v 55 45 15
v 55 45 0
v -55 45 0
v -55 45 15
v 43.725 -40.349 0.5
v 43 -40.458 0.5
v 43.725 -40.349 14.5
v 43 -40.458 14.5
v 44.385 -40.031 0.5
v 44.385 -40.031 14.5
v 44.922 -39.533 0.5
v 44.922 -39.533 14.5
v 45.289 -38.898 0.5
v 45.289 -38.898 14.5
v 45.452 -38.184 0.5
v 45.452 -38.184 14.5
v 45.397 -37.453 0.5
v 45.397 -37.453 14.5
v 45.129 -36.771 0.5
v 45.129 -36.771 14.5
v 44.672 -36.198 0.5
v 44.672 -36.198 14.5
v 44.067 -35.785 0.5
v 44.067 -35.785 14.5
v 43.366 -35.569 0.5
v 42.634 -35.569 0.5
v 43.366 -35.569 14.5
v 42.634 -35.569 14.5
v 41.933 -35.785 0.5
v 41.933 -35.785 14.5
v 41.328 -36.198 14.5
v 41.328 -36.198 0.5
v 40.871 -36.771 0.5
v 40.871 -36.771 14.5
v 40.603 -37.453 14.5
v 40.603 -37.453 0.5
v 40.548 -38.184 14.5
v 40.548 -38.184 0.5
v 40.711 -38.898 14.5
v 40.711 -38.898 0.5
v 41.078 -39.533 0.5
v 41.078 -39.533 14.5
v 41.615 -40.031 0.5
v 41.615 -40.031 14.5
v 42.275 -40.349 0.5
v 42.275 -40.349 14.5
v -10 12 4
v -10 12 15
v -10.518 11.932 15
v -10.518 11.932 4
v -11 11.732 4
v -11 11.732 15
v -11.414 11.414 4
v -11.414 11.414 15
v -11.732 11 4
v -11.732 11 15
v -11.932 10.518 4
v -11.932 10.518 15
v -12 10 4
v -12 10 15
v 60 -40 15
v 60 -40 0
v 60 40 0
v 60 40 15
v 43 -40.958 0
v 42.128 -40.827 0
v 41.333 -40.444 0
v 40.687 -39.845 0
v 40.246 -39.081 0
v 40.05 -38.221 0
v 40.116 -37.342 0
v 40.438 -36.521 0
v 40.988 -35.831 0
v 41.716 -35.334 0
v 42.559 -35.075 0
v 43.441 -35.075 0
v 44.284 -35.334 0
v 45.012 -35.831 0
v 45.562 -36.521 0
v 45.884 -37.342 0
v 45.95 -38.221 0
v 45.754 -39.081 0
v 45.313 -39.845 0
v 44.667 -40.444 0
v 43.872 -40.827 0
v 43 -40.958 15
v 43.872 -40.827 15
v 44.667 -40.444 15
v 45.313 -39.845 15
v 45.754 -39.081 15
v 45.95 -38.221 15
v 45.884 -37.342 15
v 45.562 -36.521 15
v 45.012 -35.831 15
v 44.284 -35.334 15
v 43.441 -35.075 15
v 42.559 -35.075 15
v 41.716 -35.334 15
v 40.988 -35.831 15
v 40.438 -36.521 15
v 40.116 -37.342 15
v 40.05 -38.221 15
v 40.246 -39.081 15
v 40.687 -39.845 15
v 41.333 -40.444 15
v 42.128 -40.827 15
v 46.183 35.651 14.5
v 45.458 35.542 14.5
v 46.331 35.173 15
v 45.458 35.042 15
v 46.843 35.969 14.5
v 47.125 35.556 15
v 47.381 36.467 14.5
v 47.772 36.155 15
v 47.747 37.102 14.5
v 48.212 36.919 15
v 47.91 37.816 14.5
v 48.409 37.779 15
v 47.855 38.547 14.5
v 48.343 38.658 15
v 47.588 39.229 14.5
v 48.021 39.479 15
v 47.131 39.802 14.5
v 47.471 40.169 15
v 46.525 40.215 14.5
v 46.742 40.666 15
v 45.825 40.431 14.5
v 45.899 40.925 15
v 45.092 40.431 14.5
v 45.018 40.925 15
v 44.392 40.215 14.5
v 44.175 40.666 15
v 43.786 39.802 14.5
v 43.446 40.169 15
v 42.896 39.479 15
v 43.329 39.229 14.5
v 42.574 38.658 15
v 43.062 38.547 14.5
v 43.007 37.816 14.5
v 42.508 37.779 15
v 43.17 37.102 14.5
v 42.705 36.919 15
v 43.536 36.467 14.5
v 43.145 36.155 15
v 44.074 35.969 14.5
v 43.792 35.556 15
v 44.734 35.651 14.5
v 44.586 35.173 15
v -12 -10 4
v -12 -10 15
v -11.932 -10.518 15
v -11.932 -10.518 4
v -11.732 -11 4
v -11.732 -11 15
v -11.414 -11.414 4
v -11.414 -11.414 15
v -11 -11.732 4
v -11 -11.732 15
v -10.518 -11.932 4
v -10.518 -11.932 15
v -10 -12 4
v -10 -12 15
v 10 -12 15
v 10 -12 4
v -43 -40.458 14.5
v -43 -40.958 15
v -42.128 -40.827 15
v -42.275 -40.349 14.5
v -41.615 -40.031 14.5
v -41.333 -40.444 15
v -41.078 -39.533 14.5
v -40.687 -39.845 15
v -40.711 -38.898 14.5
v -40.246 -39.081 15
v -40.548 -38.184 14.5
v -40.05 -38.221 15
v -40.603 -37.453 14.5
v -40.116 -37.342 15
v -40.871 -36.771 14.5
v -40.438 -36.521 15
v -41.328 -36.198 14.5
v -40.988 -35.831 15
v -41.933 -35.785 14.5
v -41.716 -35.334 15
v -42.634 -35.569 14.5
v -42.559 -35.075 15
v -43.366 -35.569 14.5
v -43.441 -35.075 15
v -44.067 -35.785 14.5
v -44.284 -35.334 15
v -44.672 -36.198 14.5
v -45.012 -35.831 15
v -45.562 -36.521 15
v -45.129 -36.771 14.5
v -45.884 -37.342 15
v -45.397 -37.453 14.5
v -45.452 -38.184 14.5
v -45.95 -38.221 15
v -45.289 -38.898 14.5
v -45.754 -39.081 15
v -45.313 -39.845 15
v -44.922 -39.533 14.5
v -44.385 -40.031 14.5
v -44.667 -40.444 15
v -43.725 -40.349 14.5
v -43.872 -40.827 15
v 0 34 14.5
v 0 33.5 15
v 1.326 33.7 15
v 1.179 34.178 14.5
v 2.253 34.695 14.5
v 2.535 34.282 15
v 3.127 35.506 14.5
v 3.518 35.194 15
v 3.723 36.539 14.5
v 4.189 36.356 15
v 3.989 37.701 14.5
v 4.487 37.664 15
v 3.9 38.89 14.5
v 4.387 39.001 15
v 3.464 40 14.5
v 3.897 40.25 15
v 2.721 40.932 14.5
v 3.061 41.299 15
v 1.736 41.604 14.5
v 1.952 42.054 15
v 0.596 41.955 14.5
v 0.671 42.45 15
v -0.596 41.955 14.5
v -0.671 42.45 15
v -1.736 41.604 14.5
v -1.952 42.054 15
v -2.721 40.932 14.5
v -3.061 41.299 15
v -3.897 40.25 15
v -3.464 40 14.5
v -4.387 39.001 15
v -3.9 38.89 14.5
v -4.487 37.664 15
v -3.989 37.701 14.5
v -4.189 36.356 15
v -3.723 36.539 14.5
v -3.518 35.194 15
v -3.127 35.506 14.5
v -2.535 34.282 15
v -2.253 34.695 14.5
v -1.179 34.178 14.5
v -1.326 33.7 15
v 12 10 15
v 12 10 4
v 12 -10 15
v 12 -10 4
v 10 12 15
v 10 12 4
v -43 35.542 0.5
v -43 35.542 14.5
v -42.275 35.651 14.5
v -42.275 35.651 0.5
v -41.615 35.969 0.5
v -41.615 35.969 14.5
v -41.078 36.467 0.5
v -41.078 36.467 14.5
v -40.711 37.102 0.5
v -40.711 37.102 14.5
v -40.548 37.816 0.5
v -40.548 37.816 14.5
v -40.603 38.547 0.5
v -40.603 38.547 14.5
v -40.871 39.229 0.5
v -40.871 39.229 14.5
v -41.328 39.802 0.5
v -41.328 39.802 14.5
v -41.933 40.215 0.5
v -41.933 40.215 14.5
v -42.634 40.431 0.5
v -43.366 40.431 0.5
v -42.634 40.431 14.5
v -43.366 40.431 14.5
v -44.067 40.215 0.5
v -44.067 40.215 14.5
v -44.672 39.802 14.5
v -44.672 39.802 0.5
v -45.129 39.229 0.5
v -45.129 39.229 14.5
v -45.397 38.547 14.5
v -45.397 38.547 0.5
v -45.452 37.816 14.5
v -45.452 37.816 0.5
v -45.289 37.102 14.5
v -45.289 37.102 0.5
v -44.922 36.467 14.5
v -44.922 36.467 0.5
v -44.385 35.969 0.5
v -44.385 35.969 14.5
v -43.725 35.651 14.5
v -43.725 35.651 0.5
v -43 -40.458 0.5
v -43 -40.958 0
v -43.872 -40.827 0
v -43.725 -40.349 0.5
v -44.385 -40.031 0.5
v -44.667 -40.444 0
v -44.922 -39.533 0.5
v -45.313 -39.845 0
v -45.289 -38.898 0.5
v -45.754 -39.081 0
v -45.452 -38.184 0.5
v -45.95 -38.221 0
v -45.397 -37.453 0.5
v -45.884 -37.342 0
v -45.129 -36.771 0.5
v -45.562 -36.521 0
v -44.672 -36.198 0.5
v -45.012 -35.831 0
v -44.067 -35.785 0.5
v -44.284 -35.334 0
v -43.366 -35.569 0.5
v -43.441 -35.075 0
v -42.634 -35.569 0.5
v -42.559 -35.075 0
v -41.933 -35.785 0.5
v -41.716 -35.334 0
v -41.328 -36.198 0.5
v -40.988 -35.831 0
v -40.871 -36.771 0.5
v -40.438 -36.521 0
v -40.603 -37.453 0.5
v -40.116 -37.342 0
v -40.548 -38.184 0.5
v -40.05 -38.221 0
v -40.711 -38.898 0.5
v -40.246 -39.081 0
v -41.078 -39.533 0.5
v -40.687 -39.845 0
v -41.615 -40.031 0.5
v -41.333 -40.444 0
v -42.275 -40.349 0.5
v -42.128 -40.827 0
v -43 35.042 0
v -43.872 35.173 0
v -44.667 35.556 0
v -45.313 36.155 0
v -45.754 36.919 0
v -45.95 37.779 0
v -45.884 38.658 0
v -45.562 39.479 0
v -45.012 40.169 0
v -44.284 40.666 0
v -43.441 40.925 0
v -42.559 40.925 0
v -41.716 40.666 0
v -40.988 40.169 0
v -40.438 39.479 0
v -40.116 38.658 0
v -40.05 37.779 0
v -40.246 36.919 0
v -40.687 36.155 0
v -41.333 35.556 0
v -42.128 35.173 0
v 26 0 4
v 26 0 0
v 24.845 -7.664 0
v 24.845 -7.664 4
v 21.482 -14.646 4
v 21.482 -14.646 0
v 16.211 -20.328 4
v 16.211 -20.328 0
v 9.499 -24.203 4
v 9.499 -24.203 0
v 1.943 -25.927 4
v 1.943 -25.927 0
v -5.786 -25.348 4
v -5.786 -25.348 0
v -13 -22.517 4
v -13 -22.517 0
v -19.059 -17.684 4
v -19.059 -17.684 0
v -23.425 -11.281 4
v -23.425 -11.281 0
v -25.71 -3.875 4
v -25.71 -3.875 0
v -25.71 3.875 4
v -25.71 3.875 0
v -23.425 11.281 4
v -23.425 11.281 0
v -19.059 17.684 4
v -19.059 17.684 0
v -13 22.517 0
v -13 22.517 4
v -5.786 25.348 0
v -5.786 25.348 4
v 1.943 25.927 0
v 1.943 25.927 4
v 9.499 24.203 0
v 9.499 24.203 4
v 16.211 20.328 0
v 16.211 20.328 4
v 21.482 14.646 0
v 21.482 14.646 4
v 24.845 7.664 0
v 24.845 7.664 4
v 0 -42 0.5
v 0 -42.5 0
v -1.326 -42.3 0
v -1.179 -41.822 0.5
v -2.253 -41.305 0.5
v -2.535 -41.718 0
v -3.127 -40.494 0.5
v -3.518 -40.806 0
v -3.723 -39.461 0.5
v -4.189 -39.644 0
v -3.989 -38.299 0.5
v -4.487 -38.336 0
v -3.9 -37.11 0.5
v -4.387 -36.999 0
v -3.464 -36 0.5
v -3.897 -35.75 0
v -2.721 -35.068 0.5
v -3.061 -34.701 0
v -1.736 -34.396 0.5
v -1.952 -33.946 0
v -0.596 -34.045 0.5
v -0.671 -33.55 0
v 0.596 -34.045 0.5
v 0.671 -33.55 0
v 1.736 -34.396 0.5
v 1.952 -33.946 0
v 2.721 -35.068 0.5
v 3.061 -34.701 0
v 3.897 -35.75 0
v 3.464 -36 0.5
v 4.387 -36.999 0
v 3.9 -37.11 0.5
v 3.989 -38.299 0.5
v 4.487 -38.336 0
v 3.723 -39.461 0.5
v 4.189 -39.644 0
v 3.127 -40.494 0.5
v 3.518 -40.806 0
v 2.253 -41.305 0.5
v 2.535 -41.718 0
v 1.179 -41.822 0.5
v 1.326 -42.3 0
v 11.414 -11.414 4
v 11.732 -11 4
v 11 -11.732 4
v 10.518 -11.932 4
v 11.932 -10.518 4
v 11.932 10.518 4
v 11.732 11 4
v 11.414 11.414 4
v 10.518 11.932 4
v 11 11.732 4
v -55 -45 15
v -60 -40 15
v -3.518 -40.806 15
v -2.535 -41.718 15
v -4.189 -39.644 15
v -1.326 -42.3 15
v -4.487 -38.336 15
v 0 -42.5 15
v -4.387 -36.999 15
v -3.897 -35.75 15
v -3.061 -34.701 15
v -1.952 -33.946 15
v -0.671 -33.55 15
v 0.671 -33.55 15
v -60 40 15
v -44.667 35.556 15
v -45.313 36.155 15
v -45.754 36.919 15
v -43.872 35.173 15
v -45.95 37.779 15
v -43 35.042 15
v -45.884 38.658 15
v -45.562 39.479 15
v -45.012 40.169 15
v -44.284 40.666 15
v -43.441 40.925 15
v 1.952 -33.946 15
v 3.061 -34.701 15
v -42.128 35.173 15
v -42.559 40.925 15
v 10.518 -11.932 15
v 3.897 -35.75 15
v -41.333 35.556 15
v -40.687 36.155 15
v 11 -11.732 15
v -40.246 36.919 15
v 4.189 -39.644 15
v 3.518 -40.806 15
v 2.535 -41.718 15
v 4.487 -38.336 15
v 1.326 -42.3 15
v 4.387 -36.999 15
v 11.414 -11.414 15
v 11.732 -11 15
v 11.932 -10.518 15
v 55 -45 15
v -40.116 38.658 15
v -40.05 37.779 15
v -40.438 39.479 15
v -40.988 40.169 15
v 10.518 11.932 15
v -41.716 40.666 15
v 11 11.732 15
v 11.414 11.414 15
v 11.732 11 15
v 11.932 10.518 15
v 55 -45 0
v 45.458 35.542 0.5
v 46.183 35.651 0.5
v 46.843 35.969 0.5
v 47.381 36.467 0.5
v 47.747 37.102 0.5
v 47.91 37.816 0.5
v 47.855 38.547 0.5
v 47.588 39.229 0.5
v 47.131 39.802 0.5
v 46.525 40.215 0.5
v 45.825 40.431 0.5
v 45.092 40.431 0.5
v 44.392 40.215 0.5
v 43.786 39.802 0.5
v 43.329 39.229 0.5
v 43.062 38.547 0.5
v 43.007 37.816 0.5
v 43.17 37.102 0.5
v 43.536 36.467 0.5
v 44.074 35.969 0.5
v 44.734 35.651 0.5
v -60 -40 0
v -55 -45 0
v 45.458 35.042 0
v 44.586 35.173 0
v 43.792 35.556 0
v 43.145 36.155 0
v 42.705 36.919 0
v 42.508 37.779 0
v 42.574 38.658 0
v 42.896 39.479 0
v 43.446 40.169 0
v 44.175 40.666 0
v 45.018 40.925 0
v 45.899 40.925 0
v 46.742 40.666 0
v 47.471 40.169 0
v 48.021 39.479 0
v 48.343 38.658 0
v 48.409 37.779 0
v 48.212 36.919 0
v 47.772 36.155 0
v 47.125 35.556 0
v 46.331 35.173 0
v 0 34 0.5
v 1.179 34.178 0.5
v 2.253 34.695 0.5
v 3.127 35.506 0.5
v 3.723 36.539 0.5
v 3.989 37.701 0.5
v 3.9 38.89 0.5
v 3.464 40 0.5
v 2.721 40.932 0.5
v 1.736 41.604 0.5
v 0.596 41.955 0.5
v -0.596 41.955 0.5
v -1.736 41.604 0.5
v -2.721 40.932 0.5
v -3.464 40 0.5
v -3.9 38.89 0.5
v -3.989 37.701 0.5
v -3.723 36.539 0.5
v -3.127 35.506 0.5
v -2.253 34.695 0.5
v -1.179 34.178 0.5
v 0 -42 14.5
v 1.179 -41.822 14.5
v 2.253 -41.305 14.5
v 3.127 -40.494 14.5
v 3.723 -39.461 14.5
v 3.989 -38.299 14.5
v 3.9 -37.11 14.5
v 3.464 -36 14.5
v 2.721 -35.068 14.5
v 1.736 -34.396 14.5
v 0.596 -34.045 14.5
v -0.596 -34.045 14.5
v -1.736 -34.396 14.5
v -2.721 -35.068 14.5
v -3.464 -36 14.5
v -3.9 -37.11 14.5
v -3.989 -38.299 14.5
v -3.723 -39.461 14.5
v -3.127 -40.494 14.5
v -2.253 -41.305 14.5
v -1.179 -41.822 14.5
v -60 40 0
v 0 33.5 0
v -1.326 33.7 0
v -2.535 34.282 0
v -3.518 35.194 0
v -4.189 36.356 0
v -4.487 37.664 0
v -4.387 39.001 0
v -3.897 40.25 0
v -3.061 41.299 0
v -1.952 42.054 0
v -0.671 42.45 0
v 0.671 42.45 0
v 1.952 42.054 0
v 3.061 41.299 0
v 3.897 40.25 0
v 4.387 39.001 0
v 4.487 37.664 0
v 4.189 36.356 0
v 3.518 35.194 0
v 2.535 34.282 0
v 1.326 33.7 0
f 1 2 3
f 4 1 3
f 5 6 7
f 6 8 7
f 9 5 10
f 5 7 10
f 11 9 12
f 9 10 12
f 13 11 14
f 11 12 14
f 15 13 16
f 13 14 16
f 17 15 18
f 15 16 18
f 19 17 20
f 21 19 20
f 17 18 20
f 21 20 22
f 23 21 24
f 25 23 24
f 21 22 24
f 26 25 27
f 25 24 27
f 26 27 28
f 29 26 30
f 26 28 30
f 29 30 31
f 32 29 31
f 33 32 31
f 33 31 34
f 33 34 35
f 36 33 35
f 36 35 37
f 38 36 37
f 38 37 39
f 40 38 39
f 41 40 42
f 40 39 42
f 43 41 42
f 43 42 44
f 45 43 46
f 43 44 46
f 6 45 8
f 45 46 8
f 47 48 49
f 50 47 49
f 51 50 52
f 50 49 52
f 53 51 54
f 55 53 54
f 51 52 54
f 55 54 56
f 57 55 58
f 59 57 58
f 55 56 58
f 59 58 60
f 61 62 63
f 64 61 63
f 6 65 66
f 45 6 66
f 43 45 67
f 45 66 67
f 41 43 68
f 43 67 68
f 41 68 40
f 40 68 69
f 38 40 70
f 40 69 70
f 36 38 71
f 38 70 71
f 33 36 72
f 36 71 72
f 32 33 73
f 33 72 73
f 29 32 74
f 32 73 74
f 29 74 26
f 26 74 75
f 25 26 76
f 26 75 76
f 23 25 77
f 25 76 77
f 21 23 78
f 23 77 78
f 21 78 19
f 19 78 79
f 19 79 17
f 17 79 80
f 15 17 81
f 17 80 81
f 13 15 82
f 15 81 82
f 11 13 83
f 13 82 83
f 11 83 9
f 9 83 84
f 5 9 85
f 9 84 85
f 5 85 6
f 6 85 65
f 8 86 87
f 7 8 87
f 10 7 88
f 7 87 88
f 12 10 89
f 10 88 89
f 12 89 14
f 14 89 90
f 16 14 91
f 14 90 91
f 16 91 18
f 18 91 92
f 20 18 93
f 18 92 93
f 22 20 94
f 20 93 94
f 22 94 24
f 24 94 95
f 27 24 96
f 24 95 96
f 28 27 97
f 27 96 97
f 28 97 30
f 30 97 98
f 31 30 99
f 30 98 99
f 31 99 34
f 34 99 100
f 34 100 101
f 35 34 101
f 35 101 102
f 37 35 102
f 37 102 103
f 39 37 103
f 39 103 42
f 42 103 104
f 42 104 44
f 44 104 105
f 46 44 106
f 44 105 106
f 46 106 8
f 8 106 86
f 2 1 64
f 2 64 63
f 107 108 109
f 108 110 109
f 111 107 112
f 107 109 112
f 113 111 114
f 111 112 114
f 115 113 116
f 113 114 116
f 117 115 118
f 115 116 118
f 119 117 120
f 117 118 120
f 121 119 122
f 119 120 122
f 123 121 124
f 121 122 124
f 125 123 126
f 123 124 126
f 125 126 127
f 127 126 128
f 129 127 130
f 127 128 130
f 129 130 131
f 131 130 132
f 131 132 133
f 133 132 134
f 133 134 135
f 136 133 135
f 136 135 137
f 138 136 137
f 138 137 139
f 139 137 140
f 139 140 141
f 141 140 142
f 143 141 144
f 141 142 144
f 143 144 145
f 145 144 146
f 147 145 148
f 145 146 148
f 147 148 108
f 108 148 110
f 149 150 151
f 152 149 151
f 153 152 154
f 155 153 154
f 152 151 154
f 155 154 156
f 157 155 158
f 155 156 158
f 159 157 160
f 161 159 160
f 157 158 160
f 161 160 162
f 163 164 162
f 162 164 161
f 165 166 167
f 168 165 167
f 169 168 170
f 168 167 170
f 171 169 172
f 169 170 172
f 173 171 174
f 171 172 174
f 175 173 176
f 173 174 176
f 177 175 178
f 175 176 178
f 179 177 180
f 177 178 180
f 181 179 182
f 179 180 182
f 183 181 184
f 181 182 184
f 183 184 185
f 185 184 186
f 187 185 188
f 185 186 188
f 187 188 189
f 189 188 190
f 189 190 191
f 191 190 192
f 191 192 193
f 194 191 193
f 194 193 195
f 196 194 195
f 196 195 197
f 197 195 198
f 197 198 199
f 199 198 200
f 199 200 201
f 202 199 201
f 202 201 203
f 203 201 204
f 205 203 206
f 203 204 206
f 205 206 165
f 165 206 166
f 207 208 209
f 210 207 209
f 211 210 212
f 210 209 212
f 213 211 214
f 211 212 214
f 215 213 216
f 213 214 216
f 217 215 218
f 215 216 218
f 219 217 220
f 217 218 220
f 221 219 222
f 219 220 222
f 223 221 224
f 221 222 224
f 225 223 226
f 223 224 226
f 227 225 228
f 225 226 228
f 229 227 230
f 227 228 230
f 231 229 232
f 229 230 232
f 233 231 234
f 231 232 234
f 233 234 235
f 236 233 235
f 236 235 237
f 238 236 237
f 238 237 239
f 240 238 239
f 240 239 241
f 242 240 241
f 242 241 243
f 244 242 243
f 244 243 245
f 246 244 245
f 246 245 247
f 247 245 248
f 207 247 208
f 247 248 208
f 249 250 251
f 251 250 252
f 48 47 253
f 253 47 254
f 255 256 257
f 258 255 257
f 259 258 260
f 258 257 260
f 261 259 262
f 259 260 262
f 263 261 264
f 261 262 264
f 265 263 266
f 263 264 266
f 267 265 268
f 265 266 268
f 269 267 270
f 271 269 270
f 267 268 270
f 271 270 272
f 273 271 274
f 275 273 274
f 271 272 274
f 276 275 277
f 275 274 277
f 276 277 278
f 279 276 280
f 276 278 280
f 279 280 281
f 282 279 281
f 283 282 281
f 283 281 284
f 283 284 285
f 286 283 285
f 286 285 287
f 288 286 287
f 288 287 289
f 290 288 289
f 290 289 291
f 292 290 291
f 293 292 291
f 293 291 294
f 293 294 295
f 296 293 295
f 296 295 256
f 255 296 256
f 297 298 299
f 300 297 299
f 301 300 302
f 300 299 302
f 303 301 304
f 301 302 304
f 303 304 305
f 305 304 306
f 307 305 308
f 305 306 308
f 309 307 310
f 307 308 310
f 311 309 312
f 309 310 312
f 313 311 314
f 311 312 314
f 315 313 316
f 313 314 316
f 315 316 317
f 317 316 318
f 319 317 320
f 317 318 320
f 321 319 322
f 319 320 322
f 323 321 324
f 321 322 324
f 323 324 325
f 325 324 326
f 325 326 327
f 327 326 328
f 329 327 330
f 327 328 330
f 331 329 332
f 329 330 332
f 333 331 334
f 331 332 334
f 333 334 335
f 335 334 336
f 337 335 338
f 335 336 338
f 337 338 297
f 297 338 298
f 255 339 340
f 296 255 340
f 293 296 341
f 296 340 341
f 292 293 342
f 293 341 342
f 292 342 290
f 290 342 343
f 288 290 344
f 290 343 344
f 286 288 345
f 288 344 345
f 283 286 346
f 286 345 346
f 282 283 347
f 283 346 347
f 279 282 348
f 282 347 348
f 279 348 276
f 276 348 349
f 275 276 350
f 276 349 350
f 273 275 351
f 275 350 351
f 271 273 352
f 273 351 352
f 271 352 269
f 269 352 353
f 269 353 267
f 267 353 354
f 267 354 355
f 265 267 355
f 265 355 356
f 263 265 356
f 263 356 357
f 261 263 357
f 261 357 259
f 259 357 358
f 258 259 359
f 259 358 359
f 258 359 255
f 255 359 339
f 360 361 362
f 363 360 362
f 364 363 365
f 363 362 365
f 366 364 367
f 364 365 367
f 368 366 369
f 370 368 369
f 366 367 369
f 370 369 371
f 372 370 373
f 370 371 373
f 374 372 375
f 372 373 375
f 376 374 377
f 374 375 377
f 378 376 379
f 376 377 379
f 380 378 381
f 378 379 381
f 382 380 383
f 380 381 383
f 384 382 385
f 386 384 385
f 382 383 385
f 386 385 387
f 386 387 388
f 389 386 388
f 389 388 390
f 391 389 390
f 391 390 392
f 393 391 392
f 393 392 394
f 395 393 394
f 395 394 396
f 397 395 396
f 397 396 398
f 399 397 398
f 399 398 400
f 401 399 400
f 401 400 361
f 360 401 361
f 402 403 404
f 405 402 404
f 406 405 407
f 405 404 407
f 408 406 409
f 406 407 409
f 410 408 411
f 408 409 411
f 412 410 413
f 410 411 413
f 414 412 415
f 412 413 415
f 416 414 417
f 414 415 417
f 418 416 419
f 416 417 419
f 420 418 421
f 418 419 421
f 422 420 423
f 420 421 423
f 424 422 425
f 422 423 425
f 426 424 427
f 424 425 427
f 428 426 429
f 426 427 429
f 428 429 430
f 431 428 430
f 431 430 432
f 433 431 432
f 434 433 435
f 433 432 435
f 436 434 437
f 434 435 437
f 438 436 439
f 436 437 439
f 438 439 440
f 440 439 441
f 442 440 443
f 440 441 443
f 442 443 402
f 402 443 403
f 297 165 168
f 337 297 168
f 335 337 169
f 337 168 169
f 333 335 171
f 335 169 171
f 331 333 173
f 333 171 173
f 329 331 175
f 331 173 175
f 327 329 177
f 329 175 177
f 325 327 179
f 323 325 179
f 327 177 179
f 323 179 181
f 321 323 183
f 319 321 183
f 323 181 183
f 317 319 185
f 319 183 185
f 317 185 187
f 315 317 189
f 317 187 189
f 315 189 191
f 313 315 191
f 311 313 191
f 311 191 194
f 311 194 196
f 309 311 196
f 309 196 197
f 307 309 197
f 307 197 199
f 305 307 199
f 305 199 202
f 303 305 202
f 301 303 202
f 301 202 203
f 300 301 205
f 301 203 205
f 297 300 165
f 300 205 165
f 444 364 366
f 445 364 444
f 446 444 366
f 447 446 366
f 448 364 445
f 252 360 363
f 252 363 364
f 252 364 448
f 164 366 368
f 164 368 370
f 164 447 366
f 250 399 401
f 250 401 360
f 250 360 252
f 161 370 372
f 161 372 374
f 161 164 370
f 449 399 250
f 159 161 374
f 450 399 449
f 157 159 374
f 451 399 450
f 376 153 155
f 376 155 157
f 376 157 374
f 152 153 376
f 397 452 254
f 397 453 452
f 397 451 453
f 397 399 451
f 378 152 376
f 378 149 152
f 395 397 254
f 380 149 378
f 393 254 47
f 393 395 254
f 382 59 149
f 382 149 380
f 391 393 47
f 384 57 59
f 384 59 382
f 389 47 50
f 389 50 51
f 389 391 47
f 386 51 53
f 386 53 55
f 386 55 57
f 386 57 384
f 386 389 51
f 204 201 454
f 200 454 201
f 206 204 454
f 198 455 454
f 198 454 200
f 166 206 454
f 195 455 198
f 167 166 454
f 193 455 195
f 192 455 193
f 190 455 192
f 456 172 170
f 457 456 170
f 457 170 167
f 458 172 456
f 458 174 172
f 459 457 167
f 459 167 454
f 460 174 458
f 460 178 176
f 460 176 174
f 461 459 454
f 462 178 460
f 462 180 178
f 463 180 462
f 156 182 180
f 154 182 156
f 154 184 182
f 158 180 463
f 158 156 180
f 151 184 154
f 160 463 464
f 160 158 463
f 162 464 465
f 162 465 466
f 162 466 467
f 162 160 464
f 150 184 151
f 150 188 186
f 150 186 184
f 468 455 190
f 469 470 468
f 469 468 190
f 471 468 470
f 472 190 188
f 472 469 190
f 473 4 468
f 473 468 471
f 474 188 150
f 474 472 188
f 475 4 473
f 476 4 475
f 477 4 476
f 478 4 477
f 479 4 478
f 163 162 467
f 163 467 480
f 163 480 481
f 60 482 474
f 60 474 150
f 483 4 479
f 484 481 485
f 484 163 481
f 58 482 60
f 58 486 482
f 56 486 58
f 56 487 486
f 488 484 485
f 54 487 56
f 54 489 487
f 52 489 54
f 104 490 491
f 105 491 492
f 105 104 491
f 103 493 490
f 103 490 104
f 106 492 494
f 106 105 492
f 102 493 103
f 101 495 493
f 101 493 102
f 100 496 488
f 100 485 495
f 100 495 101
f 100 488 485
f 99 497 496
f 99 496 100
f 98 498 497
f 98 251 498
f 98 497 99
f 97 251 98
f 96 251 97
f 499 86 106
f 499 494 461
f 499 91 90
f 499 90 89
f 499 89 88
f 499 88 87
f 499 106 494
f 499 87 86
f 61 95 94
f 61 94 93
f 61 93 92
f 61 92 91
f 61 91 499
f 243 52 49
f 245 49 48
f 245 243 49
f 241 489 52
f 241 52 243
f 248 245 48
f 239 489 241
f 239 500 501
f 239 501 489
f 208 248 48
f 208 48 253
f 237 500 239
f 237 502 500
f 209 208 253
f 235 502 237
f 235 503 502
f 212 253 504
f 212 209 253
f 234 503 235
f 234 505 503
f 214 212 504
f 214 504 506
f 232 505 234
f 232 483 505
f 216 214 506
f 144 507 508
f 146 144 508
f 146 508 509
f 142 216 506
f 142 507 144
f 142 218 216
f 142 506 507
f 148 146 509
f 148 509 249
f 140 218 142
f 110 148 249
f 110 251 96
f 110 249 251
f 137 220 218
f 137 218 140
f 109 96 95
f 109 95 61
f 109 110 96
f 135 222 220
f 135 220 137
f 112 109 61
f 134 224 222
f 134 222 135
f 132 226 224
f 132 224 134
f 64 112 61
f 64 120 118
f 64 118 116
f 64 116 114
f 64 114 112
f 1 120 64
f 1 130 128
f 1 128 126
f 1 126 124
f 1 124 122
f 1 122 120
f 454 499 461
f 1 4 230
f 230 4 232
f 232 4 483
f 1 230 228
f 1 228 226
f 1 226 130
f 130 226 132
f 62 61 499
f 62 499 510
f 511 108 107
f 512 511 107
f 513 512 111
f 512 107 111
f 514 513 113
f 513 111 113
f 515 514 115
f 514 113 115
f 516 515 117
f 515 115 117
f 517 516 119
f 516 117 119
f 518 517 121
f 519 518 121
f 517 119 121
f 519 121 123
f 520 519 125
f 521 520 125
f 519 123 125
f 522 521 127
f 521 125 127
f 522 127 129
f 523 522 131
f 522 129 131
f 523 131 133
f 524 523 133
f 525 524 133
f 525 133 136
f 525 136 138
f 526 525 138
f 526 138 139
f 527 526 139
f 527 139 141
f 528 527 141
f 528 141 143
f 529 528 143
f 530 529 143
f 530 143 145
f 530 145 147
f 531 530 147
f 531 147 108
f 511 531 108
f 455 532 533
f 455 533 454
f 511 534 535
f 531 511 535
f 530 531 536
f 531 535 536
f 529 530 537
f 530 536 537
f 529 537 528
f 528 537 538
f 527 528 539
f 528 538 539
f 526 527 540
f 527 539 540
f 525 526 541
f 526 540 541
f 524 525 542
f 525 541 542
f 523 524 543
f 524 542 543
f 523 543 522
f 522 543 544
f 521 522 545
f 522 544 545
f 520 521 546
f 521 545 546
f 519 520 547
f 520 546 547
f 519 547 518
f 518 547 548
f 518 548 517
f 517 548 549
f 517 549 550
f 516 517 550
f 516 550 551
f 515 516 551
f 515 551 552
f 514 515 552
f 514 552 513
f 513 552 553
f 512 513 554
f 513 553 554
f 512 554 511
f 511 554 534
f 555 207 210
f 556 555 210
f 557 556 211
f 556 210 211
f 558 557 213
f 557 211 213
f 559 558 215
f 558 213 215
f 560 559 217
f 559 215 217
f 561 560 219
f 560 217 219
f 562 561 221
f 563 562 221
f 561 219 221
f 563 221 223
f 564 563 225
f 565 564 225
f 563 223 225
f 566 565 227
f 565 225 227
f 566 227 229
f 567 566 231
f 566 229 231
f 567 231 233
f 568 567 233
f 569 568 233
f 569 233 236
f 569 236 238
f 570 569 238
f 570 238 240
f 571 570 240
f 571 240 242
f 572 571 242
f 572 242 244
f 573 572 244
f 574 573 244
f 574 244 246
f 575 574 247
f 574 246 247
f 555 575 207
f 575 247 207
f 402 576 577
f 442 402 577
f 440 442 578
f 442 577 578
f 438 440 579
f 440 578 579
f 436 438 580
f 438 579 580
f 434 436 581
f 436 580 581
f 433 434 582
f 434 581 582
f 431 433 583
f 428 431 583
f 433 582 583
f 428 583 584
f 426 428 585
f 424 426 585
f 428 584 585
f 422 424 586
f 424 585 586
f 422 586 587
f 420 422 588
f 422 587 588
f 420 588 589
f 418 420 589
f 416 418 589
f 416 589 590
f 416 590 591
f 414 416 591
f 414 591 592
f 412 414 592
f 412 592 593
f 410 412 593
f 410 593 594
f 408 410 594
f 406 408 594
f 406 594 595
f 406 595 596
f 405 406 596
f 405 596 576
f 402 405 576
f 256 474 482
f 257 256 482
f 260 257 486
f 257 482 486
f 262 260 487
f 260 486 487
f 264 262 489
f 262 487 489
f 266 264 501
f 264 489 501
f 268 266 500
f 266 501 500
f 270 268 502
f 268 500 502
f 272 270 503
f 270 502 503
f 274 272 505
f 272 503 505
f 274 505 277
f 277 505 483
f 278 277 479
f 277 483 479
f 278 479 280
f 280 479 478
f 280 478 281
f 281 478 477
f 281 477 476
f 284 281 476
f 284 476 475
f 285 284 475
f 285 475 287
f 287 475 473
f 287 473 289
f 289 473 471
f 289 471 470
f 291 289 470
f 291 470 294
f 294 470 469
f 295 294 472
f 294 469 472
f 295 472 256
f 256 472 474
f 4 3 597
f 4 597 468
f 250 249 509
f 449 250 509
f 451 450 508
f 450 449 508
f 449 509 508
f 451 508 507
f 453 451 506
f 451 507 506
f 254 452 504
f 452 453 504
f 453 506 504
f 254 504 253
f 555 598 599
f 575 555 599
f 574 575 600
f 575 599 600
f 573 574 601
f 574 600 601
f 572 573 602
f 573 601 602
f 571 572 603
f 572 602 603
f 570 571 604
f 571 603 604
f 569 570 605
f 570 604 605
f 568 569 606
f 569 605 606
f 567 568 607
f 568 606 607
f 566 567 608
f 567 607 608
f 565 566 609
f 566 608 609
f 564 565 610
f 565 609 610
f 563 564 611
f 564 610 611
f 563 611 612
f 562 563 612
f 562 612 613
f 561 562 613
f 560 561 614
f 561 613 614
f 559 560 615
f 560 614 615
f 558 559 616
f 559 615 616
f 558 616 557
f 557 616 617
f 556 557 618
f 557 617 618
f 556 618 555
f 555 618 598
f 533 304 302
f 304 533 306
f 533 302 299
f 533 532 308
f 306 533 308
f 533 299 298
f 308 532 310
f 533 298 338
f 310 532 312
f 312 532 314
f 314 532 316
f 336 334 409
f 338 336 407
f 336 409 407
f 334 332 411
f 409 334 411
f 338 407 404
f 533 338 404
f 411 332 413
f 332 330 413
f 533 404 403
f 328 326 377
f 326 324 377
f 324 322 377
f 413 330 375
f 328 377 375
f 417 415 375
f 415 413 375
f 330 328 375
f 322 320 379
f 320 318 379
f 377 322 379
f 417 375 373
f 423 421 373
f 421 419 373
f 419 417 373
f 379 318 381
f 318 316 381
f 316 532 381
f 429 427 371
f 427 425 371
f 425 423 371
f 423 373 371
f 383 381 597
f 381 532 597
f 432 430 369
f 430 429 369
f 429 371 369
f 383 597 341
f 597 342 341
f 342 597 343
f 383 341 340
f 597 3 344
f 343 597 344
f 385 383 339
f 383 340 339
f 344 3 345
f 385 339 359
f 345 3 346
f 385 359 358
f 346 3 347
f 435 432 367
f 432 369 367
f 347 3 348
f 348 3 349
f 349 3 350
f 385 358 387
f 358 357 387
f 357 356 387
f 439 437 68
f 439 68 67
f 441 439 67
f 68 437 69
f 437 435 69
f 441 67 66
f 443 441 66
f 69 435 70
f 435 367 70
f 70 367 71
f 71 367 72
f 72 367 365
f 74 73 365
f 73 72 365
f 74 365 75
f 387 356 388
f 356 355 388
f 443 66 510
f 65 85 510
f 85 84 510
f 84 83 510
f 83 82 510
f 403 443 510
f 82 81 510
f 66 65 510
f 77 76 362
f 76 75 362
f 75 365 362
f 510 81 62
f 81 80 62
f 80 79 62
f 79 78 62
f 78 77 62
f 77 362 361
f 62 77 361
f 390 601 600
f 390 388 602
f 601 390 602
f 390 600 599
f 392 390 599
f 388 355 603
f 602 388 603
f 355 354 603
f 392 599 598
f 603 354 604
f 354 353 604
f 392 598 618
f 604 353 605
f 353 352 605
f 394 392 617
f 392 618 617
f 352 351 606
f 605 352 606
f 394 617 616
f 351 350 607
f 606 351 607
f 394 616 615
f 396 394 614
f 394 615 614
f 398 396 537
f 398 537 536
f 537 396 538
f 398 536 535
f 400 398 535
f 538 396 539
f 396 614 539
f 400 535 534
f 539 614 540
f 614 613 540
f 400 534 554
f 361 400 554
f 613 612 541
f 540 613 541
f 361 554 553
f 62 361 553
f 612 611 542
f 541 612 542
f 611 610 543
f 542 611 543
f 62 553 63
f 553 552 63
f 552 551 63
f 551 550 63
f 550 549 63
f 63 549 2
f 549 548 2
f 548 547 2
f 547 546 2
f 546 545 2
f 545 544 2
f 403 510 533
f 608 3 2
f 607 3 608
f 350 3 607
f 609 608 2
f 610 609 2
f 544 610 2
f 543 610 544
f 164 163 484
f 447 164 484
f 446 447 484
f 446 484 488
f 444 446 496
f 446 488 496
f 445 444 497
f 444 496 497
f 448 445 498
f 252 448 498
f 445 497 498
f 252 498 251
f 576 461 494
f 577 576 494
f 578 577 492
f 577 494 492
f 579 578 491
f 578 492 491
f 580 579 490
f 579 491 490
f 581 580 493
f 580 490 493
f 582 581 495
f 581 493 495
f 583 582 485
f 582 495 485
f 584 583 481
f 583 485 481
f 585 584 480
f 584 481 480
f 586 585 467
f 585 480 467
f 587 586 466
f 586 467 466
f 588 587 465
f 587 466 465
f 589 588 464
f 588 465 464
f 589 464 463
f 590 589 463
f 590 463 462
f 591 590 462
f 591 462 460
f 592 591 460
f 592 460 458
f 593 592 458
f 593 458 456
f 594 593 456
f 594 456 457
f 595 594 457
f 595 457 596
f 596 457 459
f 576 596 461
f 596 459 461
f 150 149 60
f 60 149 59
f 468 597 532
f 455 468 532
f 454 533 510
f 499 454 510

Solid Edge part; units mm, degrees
sketch "Sketch1" plane through (0, 0, 0) normal (0, 0, 1) x (1, 0, 0)
  line L0 (-60, -45) -> (60, -45)
  line L1 (60, -45) -> (60, 45)
  line L2 (60, 45) -> (-60, 45)
  line L3 (-60, 45) -> (-60, -45)
extrude "Protrusion1" add sketch "Sketch1" along normal blind 15
sketch "Sketch2" plane through (0, 0, 0) normal (0, 0, -1) x (1, 0, 0)
  circle A0 centre (0, 0) radius 26
  dimension "D1" = 52
extrude "VaciadoExtruido_1" cut sketch "Sketch2" against normal blind 4
sketch "Sketch3" plane through (0, 0, 4) normal (0, 0, -1) x (1, 0, 0)
  line L0 (-12, -12) -> (12, -12)
  line L1 (12, -12) -> (12, 12)
  line L2 (12, 12) -> (-12, 12)
  line L3 (-12, 12) -> (-12, -12)
  dimension "D1" = 24
  dimension "D2" = 24
extrude "Cutout1" cut sketch "Sketch3" against normal through all
fillet "Redondeo_1" radius 2 4 edges at (-12, 12, 9.5) (-12, -12, 9.5) (12, -12, 9.5) (12, 12, 9.5)
chamfer "Chaflán_1" distance 5 angle 45 4 edges at (-60, 45, 7.5) (-60, -45, 7.5) (60, -45, 7.5) (60, 45, 7.5)
hole "Agujero_1" at (0, 38, 15) direction (0, 0, -1) diameter 8 end up to next start chamfer 0.5 start chamfer angle 45 end chamfer 0.5 end chamfer angle 45
hole "Hole1" at (0, -38, 15) direction (0, 0, -1) diameter 8 end up to next start chamfer 0.5 start chamfer angle 45 end chamfer 0.5 end chamfer angle 45
hole "Agujero_3" at (45.4585, 38, 15) direction (0, 0, -1) diameter 4.917 end through all start chamfer 0.5 start chamfer angle 45 end chamfer 0.5 end chamfer angle 45 thread major 6 thread length 2
hole "Hole2" at (43, -38, 15) direction (0, 0, -1) diameter 4.917 end through all start chamfer 0.5 start chamfer angle 45 end chamfer 0.5 end chamfer angle 45 thread major 6 thread length 2
hole "Hole3" at (-43, -38, 15) direction (0, 0, -1) diameter 4.917 end through all start chamfer 0.5 start chamfer angle 45 end chamfer 0.5 end chamfer angle 45 thread major 6 thread length 2
hole "Hole4" at (-43, 38, 15) direction (0, 0, -1) diameter 4.917 end through all start chamfer 0.5 start chamfer angle 45 end chamfer 0.5 end chamfer angle 45 thread major 6 thread length 2
